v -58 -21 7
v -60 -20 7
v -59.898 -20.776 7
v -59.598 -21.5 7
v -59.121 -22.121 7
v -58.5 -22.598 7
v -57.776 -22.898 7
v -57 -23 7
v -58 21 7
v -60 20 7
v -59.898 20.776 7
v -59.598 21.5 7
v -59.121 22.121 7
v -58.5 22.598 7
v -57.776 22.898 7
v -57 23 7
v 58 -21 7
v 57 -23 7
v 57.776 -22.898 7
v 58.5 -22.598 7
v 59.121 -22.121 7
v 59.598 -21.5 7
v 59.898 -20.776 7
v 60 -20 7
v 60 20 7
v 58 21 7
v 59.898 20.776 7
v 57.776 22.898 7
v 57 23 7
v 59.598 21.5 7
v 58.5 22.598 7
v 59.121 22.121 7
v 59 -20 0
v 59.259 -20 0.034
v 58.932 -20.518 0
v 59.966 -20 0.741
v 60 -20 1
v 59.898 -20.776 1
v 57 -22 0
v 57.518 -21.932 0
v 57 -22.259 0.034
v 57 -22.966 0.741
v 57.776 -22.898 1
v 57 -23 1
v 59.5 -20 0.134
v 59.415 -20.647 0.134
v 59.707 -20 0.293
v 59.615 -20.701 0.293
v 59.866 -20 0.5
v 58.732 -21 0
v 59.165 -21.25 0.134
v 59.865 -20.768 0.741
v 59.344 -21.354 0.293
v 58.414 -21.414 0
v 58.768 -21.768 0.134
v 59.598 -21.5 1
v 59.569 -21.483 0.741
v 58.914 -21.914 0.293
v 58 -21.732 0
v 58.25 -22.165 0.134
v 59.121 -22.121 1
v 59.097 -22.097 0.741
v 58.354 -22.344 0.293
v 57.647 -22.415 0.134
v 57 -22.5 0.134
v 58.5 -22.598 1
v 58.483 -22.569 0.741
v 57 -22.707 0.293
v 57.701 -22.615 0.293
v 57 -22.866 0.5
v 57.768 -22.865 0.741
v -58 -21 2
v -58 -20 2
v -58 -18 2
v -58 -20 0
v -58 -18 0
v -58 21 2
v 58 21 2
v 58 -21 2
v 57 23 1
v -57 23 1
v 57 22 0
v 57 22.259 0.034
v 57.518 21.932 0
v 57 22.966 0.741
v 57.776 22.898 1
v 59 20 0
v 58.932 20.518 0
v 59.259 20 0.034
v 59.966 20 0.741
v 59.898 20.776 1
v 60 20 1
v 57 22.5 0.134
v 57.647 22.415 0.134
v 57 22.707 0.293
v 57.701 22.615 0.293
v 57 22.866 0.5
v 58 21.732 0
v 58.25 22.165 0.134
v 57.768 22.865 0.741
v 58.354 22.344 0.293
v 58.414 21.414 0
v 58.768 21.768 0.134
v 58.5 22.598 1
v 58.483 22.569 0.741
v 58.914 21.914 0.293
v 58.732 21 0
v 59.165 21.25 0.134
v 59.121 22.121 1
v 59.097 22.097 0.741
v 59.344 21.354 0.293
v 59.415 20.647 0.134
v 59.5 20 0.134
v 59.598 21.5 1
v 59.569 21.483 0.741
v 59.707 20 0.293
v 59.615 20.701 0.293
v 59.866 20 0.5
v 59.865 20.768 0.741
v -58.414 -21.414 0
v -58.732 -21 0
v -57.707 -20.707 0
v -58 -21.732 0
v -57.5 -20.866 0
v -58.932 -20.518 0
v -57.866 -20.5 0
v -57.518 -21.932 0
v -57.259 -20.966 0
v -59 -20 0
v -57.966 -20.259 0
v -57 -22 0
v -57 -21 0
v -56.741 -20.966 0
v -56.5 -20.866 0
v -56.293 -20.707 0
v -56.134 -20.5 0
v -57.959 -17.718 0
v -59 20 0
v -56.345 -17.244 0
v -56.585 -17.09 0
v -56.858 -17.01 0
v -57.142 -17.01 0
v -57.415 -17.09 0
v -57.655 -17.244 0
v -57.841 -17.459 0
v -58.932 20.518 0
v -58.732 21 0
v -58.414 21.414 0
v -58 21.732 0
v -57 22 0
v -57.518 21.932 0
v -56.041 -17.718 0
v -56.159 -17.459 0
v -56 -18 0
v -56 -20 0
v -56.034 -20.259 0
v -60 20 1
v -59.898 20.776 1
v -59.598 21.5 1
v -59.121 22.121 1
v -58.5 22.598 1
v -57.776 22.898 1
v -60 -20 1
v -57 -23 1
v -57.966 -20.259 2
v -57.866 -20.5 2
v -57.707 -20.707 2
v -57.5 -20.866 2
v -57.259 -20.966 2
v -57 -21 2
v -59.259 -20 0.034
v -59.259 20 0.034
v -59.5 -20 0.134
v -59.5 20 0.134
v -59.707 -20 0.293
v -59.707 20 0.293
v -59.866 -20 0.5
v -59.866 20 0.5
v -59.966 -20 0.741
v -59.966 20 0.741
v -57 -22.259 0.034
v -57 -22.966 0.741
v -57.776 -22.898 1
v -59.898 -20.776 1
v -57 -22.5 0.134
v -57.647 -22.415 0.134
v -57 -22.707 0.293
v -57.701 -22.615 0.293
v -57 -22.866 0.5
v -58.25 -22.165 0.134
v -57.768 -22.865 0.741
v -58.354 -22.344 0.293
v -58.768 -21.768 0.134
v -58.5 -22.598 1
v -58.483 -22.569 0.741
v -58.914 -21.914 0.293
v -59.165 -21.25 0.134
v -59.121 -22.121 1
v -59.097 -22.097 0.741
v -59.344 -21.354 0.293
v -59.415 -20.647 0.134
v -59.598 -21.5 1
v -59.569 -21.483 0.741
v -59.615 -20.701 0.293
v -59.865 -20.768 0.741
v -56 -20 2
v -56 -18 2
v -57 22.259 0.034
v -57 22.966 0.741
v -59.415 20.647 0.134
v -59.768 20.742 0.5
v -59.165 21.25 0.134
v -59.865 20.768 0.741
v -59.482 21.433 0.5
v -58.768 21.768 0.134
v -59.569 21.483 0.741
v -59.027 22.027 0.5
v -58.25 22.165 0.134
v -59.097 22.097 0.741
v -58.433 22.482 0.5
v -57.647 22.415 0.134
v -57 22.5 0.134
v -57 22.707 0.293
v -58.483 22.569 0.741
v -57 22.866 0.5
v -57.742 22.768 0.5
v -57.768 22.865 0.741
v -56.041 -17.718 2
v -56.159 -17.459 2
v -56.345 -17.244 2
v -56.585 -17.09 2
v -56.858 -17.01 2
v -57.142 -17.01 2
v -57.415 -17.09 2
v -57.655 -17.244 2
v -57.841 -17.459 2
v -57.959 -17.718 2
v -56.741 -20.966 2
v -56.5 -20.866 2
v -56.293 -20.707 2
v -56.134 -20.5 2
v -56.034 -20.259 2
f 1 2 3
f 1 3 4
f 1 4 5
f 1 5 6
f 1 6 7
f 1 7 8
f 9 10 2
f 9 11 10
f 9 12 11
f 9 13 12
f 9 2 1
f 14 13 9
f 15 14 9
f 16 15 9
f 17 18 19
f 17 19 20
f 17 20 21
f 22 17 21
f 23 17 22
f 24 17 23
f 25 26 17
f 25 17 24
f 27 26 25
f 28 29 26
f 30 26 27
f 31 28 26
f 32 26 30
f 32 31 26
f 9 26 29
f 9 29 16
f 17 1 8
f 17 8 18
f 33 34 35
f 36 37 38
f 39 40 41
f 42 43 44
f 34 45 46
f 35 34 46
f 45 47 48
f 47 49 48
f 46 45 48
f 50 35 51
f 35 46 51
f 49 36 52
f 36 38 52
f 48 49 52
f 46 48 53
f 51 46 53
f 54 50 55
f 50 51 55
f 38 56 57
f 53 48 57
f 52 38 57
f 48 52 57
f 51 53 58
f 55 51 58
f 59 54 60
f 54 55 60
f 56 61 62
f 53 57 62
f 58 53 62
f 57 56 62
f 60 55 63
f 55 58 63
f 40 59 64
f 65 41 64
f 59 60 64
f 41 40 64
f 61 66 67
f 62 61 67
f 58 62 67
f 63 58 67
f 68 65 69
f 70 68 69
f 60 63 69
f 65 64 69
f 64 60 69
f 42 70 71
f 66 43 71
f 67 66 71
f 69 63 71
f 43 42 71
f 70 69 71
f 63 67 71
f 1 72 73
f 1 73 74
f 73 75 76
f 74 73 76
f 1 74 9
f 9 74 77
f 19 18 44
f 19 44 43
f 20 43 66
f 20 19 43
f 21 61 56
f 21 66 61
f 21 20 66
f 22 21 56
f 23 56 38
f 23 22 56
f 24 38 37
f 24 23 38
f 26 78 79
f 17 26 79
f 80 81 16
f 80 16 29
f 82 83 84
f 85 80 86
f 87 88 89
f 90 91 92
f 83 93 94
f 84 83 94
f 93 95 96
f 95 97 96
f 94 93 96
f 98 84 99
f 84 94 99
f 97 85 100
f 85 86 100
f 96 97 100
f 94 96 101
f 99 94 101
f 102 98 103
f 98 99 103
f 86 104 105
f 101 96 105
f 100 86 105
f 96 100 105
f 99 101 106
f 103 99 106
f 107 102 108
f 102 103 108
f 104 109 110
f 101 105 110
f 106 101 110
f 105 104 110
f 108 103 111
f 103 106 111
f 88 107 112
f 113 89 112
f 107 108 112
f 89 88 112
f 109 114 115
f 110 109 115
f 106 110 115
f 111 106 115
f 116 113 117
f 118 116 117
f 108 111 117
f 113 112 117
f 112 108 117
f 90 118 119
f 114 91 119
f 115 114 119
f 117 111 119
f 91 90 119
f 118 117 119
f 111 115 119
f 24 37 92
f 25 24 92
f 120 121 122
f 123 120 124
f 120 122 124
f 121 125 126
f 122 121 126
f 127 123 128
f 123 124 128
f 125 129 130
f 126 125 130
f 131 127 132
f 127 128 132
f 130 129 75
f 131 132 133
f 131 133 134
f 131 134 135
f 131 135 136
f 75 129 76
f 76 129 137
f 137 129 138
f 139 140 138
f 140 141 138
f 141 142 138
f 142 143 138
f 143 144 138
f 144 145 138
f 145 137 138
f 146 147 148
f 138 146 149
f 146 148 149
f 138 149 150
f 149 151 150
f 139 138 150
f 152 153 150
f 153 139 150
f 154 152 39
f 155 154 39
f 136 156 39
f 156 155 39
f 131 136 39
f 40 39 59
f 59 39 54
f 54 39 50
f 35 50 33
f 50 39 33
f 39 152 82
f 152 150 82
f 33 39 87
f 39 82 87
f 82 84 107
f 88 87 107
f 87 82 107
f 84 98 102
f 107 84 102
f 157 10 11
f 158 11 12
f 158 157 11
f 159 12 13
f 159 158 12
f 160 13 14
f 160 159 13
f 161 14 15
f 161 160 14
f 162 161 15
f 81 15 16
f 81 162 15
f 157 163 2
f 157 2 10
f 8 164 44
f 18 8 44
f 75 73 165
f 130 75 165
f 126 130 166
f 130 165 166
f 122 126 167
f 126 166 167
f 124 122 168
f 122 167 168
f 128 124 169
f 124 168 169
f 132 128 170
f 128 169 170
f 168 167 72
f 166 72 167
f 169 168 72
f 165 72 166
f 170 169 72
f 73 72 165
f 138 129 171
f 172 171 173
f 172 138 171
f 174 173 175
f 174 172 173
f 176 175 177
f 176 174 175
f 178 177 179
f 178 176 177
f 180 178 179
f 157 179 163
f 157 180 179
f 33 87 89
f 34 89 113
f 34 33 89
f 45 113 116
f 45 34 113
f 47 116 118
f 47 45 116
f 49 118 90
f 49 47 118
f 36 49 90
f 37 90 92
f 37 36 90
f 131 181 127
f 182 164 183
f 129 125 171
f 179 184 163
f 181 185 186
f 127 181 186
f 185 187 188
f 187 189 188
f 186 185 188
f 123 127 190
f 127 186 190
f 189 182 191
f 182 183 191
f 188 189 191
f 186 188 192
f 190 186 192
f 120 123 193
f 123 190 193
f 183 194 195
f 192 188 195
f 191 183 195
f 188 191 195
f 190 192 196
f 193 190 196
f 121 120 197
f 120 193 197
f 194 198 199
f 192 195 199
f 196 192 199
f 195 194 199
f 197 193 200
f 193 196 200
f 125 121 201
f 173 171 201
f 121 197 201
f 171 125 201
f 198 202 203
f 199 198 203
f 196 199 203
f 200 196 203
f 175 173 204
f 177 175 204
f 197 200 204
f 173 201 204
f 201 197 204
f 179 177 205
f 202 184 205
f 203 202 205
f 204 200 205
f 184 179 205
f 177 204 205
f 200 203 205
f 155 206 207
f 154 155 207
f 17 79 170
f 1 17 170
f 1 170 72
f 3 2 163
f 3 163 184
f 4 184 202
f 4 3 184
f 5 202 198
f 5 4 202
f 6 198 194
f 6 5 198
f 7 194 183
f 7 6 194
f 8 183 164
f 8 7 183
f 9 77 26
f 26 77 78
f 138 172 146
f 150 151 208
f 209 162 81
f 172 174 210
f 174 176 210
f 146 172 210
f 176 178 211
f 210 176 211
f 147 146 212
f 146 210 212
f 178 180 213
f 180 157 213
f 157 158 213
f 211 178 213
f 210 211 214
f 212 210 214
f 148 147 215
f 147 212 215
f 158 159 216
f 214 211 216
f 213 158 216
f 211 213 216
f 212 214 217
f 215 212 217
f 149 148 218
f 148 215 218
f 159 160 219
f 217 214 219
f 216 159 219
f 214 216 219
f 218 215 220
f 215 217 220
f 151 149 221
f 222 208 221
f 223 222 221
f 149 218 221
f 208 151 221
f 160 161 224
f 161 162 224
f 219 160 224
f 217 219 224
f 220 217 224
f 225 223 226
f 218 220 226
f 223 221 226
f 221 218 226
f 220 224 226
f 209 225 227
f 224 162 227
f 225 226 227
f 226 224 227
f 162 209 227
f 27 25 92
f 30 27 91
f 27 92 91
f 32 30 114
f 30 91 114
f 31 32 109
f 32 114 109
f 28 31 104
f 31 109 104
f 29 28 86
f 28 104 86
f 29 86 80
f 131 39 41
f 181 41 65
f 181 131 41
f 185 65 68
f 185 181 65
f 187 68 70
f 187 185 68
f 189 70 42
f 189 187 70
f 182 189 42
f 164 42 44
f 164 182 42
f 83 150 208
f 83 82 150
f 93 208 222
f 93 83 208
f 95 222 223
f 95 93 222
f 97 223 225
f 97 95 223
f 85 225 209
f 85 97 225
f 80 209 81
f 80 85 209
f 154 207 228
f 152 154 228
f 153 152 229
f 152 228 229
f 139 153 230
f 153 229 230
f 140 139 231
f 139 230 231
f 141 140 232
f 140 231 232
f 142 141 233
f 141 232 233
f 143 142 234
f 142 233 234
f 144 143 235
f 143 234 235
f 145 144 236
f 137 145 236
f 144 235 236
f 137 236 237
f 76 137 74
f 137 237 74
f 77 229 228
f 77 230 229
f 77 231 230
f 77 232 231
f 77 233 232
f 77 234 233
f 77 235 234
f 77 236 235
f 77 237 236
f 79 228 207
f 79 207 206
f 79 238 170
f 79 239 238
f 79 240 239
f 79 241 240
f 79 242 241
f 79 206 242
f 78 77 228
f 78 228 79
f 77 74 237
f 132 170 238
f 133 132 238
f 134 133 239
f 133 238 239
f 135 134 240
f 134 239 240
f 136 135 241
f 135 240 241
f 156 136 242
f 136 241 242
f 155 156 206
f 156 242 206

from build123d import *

# Parameters (mm, degrees)
F0_W     = 120
F0_H     = 46
F1_DEPTH = 2
F2_W     = 120
F2_H     = 46
F3_DEPTH = 5
F4_R     = 3
F5_R     = 1
F6_DEPTH = 25


with BuildPart() as f1:
    # F0 (on Top) → F1 (new body)
    with BuildSketch(Plane.XY):
        Rectangle(F0_W, F0_H)
    extrude(amount=F1_DEPTH)

    # F2 (on face) → F3 (join)
    with BuildSketch(Plane.XY.offset(2)):
        Rectangle(F2_W, F2_H)
        Polygon((58, 21), (58, -21), (-57.0000000355, -21), (-58, -21), (-58, -20), (-58, -18), (-58, 21), align=None, mode=Mode.SUBTRACT)
    extrude(amount=F3_DEPTH)

    # F4
    f4_edges = [f1.edges().sort_by_distance(p)[0] for p in [
        (-60, 23, 3.5),
        (-60, -23, 3.5),
        (60, 23, 3.5),
        (60, -23, 3.5),
    ]]
    fillet(f4_edges, radius=F4_R)

    # F5
    f5_edges = [f1.edges().sort_by_distance(p)[0] for p in [
        (0, 23, 0),
        (-59.12132, 22.12132, 0),
        (-60, 0, 0),
        (-59.12132, -22.12132, 0),
        (0, -23, 0),
        (60, 0, 0),
        (59.12132, 22.12132, 0),
        (59.12132, -22.12132, 0),
    ]]
    fillet(f5_edges, radius=F5_R)

    # F2 (on face) → F6 (cut)
    with BuildSketch(Plane.XY.offset(2)):
        with BuildLine():
            ThreePointArc((-56, -18), (-57, -17), (-58, -18))
            ThreePointArc((-58, -18), (-57.7071067812, -18.7071067812), (-57, -19))
            ThreePointArc((-57, -19), (-56.2928932188, -18.7071067812), (-56, -18))
        make_face()
        with BuildLine():
            ThreePointArc((-57, -19), (-56.2928932188, -19.2928932188), (-56, -20))
            Line((-56, -20), (-56, -18))
            ThreePointArc((-56, -18), (-56.2928932188, -18.7071067812), (-57, -19))
        make_face()
        with BuildLine():
            Line((-58, -18), (-58, -20))
            ThreePointArc((-58, -20), (-57.7071067812, -19.2928932188), (-57, -19))
            ThreePointArc((-57, -19), (-57.7071067812, -18.7071067812), (-58, -18))
        make_face()
        with BuildLine():
            ThreePointArc((-58, -20), (-57.7071067937, -20.7071067687), (-57.0000000355, -21))
            ThreePointArc((-57.0000000355, -21), (-56.2928932313, -20.7071067937), (-56, -20))
            ThreePointArc((-56, -20), (-56.2928932188, -19.2928932188), (-57, -19))
            ThreePointArc((-57, -19), (-57.7071067812, -19.2928932188), (-58, -20))
        make_face()
    extrude(amount=-F6_DEPTH, mode=Mode.SUBTRACT)


solid = f1.part
